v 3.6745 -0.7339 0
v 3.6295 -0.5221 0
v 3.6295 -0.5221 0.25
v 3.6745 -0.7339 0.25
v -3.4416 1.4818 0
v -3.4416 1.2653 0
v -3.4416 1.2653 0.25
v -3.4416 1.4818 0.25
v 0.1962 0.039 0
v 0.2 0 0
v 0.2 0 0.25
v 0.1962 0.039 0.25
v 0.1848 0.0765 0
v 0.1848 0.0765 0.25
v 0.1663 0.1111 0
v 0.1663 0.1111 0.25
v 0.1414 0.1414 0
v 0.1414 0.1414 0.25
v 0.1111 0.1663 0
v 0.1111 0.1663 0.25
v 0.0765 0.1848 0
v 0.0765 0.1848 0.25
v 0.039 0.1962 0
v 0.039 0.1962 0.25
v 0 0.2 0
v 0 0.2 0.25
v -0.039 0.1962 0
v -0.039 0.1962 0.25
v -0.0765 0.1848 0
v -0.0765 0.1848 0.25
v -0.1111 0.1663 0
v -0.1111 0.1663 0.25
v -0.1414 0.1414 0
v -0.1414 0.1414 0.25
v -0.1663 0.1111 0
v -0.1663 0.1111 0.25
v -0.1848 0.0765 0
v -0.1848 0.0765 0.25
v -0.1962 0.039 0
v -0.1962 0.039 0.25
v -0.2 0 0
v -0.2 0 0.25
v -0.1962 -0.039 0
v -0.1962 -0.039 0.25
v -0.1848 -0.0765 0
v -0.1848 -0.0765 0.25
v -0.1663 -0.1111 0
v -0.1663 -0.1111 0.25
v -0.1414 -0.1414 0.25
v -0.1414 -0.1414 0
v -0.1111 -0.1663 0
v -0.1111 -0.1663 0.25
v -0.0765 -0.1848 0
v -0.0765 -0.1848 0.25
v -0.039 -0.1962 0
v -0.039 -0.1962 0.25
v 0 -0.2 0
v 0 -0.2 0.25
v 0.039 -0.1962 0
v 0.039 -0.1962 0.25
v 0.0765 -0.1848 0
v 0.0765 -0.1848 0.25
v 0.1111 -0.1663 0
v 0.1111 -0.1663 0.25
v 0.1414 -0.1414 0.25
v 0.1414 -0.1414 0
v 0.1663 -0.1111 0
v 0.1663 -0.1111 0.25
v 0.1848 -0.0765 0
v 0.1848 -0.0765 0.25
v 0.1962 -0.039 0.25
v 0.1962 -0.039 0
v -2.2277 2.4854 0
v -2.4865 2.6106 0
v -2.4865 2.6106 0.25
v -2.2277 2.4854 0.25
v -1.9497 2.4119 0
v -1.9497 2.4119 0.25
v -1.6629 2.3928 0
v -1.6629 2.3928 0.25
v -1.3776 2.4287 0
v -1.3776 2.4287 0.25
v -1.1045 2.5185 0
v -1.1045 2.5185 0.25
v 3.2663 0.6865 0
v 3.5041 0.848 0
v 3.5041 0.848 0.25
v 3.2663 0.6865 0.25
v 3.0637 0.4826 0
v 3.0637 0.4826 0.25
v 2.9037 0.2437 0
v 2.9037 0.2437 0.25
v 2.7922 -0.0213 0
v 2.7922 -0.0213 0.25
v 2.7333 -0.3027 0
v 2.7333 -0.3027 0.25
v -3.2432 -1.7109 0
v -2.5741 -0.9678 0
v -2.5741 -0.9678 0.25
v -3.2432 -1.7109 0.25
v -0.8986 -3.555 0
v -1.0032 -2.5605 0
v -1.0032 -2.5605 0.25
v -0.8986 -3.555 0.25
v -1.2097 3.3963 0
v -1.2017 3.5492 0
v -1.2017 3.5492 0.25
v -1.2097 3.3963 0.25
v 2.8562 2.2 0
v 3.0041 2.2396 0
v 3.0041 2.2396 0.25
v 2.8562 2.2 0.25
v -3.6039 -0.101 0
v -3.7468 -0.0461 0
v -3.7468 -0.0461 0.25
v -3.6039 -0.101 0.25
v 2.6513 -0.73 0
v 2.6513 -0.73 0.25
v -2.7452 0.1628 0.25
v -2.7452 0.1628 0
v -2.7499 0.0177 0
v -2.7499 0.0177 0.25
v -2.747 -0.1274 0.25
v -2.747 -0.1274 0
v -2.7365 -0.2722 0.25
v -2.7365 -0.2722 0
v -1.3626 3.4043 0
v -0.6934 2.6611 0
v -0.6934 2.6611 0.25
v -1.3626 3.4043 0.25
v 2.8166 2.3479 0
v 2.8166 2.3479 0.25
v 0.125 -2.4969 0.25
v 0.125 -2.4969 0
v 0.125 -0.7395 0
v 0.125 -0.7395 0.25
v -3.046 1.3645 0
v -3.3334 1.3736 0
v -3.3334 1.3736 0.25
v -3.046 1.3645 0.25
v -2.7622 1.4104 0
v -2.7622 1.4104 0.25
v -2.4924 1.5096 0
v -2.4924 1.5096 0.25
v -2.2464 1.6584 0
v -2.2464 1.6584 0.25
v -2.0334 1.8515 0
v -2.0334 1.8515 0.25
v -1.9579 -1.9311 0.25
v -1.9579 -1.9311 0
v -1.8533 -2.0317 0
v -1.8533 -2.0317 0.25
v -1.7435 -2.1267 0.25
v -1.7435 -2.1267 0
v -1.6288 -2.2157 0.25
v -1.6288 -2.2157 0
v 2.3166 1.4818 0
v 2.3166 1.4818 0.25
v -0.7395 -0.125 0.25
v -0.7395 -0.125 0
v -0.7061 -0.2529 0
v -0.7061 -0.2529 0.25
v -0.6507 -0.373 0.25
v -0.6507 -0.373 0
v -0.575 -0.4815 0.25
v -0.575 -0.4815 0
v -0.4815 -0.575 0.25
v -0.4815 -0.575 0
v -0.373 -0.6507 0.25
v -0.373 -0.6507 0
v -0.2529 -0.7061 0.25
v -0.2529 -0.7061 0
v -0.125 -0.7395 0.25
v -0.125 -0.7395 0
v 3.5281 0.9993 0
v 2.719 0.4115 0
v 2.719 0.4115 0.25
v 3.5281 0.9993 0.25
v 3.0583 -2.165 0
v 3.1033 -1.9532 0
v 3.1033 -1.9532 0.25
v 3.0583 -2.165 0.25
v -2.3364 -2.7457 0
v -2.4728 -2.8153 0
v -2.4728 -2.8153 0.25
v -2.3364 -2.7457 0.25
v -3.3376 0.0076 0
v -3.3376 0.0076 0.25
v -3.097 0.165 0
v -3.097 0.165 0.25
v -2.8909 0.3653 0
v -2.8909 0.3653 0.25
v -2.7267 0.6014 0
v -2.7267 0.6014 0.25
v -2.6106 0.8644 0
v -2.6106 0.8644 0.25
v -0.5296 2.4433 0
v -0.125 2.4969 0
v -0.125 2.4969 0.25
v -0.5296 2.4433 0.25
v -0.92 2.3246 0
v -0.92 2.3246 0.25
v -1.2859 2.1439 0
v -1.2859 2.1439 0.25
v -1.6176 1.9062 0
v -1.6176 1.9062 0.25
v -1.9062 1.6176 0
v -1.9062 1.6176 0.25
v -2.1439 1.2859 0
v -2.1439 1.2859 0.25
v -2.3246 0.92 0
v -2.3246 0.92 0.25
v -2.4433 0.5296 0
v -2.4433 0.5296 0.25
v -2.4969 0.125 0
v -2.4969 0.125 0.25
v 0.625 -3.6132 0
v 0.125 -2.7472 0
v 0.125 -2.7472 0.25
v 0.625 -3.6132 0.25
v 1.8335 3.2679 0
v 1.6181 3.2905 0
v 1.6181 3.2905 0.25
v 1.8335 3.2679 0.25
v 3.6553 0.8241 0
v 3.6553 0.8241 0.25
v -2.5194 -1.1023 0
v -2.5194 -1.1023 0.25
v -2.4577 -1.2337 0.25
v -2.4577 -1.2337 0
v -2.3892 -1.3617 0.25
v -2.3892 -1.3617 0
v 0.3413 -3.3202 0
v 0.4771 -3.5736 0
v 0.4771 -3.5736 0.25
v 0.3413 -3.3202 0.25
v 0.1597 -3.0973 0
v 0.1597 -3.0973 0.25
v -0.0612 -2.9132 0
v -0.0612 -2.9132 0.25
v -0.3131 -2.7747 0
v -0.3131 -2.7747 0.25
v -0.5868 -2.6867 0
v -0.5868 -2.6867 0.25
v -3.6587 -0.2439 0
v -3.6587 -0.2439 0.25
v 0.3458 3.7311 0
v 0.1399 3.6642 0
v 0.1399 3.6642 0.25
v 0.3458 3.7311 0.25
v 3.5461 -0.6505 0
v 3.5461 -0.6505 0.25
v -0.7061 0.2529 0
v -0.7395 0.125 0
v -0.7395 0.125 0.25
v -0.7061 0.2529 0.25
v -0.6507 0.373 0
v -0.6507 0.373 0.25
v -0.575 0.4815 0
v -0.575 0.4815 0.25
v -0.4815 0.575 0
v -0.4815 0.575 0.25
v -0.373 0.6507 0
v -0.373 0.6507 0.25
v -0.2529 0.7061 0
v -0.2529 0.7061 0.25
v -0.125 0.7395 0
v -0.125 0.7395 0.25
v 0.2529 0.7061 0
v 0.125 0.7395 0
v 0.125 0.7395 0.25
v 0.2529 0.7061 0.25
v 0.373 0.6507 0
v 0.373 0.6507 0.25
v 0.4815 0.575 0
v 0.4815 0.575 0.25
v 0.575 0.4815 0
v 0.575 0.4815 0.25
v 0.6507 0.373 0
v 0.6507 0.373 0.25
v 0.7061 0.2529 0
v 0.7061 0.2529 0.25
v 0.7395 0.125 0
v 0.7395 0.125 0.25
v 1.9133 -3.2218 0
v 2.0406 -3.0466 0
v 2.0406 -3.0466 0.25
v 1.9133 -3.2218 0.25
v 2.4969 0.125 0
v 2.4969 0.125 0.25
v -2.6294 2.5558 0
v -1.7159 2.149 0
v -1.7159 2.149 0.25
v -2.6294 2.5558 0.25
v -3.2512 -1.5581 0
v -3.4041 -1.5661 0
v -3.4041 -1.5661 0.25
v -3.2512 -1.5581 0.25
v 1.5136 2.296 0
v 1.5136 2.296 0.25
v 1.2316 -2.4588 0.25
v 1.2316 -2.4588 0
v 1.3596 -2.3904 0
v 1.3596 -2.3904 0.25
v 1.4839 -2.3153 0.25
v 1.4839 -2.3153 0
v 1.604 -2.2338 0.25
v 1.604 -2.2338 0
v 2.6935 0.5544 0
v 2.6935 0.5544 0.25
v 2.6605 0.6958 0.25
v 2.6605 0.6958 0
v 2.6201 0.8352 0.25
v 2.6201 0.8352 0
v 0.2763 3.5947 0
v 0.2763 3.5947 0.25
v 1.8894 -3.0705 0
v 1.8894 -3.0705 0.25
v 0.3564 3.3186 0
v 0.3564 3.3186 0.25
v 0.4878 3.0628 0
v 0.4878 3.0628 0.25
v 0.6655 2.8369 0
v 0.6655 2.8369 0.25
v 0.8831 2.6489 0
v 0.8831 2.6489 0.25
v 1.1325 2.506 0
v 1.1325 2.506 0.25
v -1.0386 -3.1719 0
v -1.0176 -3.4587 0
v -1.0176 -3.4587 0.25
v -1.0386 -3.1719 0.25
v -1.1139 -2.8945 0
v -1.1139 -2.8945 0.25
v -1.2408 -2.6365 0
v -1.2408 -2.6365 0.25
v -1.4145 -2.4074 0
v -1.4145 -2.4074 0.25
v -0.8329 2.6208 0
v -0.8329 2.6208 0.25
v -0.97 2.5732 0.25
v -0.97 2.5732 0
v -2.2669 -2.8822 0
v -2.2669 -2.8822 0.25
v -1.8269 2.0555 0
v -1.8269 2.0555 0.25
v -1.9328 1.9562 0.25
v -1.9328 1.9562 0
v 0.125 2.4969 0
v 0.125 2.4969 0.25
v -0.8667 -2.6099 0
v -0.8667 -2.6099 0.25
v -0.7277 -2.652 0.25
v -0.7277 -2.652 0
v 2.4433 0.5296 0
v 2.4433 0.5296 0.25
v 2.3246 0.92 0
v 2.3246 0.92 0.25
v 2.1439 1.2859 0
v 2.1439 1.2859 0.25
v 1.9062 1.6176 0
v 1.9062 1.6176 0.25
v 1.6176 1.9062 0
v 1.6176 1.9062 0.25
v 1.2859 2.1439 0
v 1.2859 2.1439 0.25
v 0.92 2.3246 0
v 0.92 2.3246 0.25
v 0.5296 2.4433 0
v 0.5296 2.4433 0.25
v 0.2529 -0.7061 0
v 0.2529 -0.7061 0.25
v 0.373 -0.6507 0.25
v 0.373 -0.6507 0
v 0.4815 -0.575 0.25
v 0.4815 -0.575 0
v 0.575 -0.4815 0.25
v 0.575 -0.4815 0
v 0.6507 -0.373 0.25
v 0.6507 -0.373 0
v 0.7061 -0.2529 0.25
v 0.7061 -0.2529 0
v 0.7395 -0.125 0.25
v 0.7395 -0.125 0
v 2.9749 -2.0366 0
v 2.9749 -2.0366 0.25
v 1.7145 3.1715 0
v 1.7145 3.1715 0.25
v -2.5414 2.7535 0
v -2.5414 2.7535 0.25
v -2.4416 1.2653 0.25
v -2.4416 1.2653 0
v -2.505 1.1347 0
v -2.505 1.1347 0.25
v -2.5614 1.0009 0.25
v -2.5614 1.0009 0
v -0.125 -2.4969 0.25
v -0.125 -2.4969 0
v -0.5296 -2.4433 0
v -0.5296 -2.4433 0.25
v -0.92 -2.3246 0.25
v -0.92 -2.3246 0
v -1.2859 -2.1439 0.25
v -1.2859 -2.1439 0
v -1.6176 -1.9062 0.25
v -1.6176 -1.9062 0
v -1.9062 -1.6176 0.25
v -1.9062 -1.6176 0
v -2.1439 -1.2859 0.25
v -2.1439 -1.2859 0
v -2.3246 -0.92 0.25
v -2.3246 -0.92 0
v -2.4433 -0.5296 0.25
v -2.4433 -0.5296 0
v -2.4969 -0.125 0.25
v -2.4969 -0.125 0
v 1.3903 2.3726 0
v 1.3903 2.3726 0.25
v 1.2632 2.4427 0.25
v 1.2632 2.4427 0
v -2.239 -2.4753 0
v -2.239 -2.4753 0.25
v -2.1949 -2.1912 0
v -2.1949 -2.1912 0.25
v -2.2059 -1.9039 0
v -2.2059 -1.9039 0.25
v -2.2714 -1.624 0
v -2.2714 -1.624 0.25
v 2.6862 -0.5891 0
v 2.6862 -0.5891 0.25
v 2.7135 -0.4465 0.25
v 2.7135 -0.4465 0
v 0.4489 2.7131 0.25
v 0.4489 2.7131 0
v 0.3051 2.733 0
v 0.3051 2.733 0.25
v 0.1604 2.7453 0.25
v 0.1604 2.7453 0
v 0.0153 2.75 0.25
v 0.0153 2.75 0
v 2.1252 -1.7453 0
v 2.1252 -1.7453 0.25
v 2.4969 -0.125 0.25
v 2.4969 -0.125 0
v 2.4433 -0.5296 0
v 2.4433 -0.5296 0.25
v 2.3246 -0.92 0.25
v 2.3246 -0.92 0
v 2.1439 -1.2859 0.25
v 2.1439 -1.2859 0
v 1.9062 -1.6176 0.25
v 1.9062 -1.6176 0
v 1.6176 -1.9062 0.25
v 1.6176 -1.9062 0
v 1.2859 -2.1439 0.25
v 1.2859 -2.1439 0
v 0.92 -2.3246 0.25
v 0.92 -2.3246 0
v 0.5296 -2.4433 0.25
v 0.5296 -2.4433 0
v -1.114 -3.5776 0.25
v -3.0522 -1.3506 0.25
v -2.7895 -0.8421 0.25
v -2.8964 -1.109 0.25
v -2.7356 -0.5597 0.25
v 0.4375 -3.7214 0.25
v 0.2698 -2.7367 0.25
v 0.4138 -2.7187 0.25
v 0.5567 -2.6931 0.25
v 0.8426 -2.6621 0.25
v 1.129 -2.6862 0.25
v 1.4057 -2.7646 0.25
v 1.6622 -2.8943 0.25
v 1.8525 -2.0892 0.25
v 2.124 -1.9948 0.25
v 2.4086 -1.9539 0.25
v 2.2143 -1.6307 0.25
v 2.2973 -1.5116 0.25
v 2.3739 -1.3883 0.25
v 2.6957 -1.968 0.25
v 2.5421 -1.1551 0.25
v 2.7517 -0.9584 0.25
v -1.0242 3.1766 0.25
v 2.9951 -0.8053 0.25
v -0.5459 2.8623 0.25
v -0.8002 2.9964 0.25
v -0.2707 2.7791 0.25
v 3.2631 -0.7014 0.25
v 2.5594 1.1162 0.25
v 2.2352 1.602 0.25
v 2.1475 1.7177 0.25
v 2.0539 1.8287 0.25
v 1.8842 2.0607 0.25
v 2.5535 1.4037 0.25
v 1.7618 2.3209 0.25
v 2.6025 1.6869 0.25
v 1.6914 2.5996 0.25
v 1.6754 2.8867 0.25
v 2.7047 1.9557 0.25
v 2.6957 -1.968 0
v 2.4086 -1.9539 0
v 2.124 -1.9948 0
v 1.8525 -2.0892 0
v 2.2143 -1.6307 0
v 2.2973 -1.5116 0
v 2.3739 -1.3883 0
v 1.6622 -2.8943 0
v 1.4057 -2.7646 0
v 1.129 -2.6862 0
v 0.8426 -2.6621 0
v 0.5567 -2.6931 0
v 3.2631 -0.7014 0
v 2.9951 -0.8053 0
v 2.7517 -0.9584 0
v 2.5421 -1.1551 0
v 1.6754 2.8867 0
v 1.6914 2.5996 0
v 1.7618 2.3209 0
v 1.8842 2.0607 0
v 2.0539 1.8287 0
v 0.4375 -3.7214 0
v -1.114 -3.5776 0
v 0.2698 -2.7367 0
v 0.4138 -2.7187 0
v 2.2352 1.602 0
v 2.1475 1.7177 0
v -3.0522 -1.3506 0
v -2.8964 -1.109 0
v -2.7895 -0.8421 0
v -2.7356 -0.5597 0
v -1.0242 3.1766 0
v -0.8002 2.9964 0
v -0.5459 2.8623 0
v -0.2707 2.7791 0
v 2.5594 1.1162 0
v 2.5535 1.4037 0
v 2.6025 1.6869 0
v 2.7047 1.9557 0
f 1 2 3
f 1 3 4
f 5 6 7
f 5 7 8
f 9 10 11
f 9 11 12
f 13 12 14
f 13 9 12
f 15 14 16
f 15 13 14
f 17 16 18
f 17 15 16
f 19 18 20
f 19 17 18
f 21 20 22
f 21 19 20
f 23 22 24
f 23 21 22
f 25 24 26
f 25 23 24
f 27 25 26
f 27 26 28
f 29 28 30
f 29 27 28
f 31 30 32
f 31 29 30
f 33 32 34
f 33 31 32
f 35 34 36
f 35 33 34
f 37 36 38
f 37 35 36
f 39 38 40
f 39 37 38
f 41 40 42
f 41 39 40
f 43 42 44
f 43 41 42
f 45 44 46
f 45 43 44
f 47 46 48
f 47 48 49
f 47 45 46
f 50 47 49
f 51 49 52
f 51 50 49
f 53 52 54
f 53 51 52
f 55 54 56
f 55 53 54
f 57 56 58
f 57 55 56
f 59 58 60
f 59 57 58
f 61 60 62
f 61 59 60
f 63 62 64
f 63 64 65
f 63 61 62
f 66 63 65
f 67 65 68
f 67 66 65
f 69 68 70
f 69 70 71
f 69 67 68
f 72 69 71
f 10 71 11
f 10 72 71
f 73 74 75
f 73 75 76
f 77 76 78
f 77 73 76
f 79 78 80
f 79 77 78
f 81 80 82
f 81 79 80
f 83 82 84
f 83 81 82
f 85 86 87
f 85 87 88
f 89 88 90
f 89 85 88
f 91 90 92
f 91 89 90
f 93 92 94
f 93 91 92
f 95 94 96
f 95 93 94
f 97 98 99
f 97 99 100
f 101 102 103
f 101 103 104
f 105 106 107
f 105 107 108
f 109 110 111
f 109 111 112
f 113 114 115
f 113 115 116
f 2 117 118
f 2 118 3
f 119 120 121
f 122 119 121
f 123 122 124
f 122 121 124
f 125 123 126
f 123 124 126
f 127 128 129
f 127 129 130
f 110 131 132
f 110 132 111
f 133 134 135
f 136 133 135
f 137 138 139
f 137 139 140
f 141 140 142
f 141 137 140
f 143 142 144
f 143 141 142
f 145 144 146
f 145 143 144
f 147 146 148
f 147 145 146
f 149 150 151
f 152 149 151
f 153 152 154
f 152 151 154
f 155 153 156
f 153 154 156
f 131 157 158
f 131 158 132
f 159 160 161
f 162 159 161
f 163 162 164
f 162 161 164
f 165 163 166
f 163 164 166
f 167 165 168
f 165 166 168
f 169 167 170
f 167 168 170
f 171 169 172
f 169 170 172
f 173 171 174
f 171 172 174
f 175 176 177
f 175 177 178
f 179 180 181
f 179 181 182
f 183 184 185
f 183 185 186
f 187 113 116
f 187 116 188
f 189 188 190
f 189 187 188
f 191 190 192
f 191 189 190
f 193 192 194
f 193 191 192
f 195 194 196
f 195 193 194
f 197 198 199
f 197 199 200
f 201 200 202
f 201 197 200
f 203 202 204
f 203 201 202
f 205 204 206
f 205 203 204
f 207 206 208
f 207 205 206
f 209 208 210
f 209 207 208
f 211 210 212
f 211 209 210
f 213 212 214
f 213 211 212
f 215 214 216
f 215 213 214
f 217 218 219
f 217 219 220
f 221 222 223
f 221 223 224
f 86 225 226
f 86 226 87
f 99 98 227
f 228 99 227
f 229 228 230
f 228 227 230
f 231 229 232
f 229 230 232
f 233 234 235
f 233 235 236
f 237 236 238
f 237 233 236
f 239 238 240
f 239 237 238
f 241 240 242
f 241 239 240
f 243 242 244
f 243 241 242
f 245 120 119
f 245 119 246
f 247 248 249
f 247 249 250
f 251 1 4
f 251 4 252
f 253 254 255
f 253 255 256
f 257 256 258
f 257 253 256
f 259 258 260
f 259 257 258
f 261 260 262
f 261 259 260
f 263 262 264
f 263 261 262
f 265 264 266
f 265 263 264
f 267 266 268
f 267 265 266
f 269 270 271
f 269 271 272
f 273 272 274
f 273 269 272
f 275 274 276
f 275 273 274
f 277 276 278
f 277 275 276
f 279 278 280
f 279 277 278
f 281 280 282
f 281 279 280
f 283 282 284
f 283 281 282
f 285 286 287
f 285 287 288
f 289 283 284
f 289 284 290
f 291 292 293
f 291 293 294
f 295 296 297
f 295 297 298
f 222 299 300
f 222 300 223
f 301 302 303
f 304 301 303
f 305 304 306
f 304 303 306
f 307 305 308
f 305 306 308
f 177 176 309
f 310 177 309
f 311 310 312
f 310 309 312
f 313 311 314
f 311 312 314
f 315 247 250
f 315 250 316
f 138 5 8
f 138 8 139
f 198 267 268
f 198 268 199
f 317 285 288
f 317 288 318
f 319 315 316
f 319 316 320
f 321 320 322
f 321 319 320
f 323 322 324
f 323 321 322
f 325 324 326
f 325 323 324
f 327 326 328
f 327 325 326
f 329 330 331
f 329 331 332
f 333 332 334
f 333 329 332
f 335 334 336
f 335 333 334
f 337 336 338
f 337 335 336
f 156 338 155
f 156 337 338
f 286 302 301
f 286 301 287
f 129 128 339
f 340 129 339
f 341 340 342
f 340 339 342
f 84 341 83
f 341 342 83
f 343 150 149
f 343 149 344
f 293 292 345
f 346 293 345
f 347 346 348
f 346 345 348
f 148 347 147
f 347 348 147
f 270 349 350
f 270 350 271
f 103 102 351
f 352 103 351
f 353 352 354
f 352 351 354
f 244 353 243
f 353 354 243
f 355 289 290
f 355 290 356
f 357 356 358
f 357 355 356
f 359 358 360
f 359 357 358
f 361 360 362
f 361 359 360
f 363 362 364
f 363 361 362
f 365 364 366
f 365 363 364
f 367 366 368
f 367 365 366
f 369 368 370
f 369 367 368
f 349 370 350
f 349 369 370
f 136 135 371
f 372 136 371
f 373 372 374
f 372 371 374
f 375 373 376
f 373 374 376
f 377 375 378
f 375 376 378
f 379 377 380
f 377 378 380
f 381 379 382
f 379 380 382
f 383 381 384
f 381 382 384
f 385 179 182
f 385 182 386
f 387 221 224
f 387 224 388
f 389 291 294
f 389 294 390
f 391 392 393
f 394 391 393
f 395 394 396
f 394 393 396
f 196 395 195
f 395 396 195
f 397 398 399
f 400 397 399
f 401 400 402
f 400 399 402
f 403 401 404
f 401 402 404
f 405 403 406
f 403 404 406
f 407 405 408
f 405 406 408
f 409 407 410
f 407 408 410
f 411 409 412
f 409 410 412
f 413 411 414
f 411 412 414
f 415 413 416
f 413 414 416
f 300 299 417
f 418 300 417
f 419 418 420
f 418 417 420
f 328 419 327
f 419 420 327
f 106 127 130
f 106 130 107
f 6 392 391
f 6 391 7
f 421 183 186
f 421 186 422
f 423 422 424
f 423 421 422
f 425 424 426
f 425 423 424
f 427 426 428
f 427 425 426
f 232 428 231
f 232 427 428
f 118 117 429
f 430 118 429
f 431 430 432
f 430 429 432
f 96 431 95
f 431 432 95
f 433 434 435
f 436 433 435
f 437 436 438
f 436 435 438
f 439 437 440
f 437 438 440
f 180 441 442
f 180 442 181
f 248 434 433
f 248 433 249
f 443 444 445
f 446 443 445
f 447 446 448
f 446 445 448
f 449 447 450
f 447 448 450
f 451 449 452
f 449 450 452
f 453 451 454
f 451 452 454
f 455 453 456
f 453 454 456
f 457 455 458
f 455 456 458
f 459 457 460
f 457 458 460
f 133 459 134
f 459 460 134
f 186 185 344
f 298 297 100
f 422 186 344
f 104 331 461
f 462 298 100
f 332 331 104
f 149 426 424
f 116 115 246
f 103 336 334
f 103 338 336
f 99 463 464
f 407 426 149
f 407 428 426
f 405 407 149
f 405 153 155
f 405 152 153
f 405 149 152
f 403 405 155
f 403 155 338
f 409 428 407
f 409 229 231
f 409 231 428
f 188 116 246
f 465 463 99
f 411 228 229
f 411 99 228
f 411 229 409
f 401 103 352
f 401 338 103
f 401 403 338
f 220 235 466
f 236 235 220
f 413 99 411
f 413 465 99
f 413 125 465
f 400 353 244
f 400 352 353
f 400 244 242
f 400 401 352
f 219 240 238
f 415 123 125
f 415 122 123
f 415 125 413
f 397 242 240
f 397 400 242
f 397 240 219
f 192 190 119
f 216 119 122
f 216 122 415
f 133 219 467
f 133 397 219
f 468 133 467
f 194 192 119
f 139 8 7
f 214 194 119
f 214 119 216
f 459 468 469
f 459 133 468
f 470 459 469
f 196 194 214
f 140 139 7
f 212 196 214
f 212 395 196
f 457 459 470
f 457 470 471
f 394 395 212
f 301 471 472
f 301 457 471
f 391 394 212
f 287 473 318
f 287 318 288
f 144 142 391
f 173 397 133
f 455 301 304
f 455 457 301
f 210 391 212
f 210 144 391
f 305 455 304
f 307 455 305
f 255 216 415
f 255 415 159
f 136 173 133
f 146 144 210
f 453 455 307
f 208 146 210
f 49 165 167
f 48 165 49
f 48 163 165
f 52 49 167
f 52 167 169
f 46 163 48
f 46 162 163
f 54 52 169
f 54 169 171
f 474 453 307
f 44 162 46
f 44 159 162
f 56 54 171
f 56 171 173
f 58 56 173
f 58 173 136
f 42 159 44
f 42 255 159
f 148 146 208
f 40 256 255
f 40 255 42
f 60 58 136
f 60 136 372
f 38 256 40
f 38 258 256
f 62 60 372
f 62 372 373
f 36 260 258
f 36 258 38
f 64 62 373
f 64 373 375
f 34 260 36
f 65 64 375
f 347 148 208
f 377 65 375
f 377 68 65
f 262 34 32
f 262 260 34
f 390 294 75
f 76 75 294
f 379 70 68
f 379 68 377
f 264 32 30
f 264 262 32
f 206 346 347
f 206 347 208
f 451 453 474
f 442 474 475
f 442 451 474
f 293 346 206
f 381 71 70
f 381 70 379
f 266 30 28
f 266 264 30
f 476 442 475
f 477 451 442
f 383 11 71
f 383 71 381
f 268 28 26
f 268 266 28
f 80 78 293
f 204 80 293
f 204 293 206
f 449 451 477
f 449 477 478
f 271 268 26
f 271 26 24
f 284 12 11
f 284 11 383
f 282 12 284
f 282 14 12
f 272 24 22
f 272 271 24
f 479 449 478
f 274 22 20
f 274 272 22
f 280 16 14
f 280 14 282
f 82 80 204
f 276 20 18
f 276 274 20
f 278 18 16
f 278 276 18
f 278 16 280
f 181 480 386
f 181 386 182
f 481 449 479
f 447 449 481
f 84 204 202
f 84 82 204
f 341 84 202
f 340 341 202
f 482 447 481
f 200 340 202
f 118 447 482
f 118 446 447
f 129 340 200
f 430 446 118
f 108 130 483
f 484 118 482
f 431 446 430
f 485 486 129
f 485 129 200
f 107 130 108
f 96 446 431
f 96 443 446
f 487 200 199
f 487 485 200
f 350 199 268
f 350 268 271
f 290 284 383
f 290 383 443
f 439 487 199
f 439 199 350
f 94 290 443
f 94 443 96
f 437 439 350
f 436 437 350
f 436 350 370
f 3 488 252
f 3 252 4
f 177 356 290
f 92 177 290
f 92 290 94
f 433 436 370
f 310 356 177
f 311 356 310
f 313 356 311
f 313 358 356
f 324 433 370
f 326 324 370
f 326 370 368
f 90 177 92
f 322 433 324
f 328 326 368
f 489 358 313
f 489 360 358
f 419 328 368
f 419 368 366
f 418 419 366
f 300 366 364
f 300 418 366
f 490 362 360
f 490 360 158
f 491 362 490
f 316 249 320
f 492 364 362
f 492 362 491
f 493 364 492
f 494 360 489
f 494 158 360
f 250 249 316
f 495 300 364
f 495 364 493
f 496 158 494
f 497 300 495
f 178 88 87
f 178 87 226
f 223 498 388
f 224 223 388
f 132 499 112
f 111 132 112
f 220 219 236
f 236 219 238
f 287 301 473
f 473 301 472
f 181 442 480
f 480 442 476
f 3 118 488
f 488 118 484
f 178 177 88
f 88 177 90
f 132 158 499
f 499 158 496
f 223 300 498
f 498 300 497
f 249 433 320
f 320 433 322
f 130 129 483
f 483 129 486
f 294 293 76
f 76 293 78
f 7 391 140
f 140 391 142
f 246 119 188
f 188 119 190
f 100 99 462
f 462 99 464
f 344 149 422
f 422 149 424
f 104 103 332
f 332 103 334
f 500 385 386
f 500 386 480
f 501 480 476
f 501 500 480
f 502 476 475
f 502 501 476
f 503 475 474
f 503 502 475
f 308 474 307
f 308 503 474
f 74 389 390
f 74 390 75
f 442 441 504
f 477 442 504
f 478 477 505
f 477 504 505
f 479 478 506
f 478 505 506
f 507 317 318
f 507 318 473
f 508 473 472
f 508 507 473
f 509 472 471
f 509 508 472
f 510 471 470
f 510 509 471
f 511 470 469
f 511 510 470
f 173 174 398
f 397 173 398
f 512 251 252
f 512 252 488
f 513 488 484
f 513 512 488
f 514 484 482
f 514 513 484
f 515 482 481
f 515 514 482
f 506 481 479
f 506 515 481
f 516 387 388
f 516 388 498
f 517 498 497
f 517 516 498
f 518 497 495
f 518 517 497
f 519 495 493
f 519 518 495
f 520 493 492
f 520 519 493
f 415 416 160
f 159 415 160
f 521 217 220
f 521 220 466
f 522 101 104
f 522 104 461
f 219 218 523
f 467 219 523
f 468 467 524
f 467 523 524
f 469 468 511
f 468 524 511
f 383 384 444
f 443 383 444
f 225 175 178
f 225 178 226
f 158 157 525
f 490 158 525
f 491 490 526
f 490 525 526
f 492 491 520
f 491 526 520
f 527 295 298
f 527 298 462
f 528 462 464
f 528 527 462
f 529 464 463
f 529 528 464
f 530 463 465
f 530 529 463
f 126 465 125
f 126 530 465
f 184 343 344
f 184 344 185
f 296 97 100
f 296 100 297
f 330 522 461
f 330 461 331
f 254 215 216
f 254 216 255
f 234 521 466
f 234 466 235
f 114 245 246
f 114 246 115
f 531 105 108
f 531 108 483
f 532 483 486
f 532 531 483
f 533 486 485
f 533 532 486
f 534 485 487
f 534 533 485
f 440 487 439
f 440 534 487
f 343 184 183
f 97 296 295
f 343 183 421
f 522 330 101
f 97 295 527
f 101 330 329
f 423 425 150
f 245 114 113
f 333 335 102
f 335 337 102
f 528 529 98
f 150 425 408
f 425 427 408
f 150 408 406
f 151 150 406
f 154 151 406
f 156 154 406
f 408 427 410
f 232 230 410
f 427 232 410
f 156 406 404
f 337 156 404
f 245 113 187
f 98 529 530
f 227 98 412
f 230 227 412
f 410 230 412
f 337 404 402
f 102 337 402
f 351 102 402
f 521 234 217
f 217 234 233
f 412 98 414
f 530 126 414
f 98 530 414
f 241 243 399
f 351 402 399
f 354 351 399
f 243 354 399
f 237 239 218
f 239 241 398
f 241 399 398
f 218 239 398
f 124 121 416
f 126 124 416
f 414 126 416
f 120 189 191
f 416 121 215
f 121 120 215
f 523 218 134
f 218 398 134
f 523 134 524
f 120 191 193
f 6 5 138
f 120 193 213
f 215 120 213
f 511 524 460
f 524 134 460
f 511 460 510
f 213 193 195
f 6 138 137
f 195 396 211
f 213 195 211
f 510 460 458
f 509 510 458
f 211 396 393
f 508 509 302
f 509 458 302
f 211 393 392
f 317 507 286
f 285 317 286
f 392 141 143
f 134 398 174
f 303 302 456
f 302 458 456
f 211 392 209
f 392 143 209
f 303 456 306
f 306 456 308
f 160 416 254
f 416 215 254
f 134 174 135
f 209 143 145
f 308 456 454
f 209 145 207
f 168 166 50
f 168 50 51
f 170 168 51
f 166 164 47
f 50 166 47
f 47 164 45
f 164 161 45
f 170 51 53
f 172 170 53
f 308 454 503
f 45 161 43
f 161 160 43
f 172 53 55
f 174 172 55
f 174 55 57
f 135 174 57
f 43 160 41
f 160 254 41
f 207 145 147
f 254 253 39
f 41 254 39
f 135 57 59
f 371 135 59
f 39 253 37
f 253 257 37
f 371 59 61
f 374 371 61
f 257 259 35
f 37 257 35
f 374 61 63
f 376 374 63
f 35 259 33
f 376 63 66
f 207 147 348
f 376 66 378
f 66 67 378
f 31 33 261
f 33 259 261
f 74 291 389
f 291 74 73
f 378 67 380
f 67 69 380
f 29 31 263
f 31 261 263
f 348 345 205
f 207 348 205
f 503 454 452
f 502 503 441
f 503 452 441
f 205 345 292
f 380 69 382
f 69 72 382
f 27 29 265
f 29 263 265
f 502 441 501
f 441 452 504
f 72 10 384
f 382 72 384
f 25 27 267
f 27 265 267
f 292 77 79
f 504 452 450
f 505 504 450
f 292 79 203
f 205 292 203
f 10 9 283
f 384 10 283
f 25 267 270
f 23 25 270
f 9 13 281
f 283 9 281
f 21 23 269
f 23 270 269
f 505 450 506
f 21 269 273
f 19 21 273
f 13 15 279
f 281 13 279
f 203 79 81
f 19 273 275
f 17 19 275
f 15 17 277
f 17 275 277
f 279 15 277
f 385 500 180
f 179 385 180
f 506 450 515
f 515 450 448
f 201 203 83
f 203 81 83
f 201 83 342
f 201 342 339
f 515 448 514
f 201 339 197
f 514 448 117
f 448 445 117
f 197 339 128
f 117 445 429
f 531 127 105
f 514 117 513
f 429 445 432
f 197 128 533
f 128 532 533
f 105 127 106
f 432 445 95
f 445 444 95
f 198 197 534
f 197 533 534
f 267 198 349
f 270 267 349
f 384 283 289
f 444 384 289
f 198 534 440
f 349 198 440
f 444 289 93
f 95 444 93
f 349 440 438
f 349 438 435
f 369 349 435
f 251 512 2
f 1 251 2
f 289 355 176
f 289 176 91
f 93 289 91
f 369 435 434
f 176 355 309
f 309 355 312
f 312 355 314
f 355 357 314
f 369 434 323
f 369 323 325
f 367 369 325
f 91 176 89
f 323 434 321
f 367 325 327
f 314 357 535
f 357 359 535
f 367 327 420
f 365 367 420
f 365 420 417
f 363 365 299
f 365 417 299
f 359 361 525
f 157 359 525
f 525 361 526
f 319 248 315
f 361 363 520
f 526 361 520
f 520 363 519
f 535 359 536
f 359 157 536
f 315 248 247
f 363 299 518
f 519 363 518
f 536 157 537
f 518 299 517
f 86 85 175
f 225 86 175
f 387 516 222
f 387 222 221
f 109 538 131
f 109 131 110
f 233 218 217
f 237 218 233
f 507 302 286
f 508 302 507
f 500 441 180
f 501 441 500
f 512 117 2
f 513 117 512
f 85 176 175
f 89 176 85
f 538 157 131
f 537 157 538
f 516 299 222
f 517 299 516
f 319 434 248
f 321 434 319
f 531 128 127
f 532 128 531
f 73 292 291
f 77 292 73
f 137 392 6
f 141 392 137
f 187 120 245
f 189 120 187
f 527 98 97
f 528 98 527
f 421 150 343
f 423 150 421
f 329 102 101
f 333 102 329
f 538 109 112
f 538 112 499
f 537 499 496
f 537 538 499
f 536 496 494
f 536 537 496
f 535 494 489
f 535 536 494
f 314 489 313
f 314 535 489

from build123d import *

# Parameters (mm, degrees)
CROQUIS1_R              = 2.75
CROQUIS1_R_2            = 0.2
SALIENTE_EXTRUIR1_DEPTH = 0.25
SALIENTE_EXTRUIR2_DEPTH = 0.25
MATRIZC1_COUNT          = 15


with BuildPart() as part:
    # Croquis1 → Saliente-Extruir1 (new body)
    with BuildSketch(Plane.XY):
        Circle(CROQUIS1_R)
        Circle(CROQUIS1_R_2, mode=Mode.SUBTRACT)
        with BuildLine():
            Line((0.125, -2.496873044), (0.125, -0.739509973))
            ThreePointArc((0.125, -0.739509973), (0.530330086, -0.530330086), (0.739509973, -0.125))
            Line((0.739509973, -0.125), (2.496873044, -0.125))
            ThreePointArc((2.496873044, -0.125), (1.767766953, -1.767766953), (0.125, -2.496873044))
        make_face(mode=Mode.SUBTRACT)
        with BuildLine():
            ThreePointArc((-0.125, 2.496873044), (-1.767766953, 1.767766953), (-2.496873044, 0.125))
            Line((-2.496873044, 0.125), (-0.739509973, 0.125))
            ThreePointArc((-0.739509973, 0.125), (-0.530330086, 0.530330086), (-0.125, 0.739509973))
            Line((-0.125, 0.739509973), (-0.125, 2.496873044))
        make_face(mode=Mode.SUBTRACT)
        with BuildLine():
            Line((0.739509973, 0.125), (2.496873044, 0.125))
            ThreePointArc((2.496873044, 0.125), (1.767766953, 1.767766953), (0.125, 2.496873044))
            Line((0.125, 2.496873044), (0.125, 0.739509973))
            ThreePointArc((0.125, 0.739509973), (0.530330086, 0.530330086), (0.739509973, 0.125))
        make_face(mode=Mode.SUBTRACT)
        with BuildLine():
            Line((-2.496873044, -0.125), (-0.739509973, -0.125))
            ThreePointArc((-0.739509973, -0.125), (-0.530330086, -0.530330086), (-0.125, -0.739509973))
            Line((-0.125, -0.739509973), (-0.125, -2.496873044))
            ThreePointArc((-0.125, -2.496873044), (-1.767766953, -1.767766953), (-2.496873044, -0.125))
        make_face(mode=Mode.SUBTRACT)
    extrude(amount=SALIENTE_EXTRUIR1_DEPTH)

    # Croquis2 → Saliente-Extruir2 (add)
    with BuildSketch(Plane(origin=(0, 0, 0), x_dir=(-1, 0, 0), z_dir=(0, 0, -1))):
        with BuildLine():
            Line((-0.625, -3.613183026), (-0.4375, -3.721436201))
            Line((-0.4375, -3.721436201), (-0.477123412, -3.573559614))
            ThreePointArc((-0.477123412, -3.573559614), (-0.053677893, -2.999971472), (0.586755021, -2.686674254))
            ThreePointArc((0.586755021, -2.686674254), (0.232849703, -2.74012427), (-0.125, -2.747157622))
            Line((-0.125, -2.747157622), (-0.625, -3.613183026))
        make_face()
    saliente_extruir2 = extrude(amount=-SALIENTE_EXTRUIR2_DEPTH)

    # MatrizC1: Saliente-Extruir2 ×15 about axis
    matrizc1_axis = Axis((0, 0, 0), (0, 0, 1))
    for i in range(1, MATRIZC1_COUNT):
        add(saliente_extruir2.rotate(matrizc1_axis, i * 360 / MATRIZC1_COUNT))


solid = part.part
